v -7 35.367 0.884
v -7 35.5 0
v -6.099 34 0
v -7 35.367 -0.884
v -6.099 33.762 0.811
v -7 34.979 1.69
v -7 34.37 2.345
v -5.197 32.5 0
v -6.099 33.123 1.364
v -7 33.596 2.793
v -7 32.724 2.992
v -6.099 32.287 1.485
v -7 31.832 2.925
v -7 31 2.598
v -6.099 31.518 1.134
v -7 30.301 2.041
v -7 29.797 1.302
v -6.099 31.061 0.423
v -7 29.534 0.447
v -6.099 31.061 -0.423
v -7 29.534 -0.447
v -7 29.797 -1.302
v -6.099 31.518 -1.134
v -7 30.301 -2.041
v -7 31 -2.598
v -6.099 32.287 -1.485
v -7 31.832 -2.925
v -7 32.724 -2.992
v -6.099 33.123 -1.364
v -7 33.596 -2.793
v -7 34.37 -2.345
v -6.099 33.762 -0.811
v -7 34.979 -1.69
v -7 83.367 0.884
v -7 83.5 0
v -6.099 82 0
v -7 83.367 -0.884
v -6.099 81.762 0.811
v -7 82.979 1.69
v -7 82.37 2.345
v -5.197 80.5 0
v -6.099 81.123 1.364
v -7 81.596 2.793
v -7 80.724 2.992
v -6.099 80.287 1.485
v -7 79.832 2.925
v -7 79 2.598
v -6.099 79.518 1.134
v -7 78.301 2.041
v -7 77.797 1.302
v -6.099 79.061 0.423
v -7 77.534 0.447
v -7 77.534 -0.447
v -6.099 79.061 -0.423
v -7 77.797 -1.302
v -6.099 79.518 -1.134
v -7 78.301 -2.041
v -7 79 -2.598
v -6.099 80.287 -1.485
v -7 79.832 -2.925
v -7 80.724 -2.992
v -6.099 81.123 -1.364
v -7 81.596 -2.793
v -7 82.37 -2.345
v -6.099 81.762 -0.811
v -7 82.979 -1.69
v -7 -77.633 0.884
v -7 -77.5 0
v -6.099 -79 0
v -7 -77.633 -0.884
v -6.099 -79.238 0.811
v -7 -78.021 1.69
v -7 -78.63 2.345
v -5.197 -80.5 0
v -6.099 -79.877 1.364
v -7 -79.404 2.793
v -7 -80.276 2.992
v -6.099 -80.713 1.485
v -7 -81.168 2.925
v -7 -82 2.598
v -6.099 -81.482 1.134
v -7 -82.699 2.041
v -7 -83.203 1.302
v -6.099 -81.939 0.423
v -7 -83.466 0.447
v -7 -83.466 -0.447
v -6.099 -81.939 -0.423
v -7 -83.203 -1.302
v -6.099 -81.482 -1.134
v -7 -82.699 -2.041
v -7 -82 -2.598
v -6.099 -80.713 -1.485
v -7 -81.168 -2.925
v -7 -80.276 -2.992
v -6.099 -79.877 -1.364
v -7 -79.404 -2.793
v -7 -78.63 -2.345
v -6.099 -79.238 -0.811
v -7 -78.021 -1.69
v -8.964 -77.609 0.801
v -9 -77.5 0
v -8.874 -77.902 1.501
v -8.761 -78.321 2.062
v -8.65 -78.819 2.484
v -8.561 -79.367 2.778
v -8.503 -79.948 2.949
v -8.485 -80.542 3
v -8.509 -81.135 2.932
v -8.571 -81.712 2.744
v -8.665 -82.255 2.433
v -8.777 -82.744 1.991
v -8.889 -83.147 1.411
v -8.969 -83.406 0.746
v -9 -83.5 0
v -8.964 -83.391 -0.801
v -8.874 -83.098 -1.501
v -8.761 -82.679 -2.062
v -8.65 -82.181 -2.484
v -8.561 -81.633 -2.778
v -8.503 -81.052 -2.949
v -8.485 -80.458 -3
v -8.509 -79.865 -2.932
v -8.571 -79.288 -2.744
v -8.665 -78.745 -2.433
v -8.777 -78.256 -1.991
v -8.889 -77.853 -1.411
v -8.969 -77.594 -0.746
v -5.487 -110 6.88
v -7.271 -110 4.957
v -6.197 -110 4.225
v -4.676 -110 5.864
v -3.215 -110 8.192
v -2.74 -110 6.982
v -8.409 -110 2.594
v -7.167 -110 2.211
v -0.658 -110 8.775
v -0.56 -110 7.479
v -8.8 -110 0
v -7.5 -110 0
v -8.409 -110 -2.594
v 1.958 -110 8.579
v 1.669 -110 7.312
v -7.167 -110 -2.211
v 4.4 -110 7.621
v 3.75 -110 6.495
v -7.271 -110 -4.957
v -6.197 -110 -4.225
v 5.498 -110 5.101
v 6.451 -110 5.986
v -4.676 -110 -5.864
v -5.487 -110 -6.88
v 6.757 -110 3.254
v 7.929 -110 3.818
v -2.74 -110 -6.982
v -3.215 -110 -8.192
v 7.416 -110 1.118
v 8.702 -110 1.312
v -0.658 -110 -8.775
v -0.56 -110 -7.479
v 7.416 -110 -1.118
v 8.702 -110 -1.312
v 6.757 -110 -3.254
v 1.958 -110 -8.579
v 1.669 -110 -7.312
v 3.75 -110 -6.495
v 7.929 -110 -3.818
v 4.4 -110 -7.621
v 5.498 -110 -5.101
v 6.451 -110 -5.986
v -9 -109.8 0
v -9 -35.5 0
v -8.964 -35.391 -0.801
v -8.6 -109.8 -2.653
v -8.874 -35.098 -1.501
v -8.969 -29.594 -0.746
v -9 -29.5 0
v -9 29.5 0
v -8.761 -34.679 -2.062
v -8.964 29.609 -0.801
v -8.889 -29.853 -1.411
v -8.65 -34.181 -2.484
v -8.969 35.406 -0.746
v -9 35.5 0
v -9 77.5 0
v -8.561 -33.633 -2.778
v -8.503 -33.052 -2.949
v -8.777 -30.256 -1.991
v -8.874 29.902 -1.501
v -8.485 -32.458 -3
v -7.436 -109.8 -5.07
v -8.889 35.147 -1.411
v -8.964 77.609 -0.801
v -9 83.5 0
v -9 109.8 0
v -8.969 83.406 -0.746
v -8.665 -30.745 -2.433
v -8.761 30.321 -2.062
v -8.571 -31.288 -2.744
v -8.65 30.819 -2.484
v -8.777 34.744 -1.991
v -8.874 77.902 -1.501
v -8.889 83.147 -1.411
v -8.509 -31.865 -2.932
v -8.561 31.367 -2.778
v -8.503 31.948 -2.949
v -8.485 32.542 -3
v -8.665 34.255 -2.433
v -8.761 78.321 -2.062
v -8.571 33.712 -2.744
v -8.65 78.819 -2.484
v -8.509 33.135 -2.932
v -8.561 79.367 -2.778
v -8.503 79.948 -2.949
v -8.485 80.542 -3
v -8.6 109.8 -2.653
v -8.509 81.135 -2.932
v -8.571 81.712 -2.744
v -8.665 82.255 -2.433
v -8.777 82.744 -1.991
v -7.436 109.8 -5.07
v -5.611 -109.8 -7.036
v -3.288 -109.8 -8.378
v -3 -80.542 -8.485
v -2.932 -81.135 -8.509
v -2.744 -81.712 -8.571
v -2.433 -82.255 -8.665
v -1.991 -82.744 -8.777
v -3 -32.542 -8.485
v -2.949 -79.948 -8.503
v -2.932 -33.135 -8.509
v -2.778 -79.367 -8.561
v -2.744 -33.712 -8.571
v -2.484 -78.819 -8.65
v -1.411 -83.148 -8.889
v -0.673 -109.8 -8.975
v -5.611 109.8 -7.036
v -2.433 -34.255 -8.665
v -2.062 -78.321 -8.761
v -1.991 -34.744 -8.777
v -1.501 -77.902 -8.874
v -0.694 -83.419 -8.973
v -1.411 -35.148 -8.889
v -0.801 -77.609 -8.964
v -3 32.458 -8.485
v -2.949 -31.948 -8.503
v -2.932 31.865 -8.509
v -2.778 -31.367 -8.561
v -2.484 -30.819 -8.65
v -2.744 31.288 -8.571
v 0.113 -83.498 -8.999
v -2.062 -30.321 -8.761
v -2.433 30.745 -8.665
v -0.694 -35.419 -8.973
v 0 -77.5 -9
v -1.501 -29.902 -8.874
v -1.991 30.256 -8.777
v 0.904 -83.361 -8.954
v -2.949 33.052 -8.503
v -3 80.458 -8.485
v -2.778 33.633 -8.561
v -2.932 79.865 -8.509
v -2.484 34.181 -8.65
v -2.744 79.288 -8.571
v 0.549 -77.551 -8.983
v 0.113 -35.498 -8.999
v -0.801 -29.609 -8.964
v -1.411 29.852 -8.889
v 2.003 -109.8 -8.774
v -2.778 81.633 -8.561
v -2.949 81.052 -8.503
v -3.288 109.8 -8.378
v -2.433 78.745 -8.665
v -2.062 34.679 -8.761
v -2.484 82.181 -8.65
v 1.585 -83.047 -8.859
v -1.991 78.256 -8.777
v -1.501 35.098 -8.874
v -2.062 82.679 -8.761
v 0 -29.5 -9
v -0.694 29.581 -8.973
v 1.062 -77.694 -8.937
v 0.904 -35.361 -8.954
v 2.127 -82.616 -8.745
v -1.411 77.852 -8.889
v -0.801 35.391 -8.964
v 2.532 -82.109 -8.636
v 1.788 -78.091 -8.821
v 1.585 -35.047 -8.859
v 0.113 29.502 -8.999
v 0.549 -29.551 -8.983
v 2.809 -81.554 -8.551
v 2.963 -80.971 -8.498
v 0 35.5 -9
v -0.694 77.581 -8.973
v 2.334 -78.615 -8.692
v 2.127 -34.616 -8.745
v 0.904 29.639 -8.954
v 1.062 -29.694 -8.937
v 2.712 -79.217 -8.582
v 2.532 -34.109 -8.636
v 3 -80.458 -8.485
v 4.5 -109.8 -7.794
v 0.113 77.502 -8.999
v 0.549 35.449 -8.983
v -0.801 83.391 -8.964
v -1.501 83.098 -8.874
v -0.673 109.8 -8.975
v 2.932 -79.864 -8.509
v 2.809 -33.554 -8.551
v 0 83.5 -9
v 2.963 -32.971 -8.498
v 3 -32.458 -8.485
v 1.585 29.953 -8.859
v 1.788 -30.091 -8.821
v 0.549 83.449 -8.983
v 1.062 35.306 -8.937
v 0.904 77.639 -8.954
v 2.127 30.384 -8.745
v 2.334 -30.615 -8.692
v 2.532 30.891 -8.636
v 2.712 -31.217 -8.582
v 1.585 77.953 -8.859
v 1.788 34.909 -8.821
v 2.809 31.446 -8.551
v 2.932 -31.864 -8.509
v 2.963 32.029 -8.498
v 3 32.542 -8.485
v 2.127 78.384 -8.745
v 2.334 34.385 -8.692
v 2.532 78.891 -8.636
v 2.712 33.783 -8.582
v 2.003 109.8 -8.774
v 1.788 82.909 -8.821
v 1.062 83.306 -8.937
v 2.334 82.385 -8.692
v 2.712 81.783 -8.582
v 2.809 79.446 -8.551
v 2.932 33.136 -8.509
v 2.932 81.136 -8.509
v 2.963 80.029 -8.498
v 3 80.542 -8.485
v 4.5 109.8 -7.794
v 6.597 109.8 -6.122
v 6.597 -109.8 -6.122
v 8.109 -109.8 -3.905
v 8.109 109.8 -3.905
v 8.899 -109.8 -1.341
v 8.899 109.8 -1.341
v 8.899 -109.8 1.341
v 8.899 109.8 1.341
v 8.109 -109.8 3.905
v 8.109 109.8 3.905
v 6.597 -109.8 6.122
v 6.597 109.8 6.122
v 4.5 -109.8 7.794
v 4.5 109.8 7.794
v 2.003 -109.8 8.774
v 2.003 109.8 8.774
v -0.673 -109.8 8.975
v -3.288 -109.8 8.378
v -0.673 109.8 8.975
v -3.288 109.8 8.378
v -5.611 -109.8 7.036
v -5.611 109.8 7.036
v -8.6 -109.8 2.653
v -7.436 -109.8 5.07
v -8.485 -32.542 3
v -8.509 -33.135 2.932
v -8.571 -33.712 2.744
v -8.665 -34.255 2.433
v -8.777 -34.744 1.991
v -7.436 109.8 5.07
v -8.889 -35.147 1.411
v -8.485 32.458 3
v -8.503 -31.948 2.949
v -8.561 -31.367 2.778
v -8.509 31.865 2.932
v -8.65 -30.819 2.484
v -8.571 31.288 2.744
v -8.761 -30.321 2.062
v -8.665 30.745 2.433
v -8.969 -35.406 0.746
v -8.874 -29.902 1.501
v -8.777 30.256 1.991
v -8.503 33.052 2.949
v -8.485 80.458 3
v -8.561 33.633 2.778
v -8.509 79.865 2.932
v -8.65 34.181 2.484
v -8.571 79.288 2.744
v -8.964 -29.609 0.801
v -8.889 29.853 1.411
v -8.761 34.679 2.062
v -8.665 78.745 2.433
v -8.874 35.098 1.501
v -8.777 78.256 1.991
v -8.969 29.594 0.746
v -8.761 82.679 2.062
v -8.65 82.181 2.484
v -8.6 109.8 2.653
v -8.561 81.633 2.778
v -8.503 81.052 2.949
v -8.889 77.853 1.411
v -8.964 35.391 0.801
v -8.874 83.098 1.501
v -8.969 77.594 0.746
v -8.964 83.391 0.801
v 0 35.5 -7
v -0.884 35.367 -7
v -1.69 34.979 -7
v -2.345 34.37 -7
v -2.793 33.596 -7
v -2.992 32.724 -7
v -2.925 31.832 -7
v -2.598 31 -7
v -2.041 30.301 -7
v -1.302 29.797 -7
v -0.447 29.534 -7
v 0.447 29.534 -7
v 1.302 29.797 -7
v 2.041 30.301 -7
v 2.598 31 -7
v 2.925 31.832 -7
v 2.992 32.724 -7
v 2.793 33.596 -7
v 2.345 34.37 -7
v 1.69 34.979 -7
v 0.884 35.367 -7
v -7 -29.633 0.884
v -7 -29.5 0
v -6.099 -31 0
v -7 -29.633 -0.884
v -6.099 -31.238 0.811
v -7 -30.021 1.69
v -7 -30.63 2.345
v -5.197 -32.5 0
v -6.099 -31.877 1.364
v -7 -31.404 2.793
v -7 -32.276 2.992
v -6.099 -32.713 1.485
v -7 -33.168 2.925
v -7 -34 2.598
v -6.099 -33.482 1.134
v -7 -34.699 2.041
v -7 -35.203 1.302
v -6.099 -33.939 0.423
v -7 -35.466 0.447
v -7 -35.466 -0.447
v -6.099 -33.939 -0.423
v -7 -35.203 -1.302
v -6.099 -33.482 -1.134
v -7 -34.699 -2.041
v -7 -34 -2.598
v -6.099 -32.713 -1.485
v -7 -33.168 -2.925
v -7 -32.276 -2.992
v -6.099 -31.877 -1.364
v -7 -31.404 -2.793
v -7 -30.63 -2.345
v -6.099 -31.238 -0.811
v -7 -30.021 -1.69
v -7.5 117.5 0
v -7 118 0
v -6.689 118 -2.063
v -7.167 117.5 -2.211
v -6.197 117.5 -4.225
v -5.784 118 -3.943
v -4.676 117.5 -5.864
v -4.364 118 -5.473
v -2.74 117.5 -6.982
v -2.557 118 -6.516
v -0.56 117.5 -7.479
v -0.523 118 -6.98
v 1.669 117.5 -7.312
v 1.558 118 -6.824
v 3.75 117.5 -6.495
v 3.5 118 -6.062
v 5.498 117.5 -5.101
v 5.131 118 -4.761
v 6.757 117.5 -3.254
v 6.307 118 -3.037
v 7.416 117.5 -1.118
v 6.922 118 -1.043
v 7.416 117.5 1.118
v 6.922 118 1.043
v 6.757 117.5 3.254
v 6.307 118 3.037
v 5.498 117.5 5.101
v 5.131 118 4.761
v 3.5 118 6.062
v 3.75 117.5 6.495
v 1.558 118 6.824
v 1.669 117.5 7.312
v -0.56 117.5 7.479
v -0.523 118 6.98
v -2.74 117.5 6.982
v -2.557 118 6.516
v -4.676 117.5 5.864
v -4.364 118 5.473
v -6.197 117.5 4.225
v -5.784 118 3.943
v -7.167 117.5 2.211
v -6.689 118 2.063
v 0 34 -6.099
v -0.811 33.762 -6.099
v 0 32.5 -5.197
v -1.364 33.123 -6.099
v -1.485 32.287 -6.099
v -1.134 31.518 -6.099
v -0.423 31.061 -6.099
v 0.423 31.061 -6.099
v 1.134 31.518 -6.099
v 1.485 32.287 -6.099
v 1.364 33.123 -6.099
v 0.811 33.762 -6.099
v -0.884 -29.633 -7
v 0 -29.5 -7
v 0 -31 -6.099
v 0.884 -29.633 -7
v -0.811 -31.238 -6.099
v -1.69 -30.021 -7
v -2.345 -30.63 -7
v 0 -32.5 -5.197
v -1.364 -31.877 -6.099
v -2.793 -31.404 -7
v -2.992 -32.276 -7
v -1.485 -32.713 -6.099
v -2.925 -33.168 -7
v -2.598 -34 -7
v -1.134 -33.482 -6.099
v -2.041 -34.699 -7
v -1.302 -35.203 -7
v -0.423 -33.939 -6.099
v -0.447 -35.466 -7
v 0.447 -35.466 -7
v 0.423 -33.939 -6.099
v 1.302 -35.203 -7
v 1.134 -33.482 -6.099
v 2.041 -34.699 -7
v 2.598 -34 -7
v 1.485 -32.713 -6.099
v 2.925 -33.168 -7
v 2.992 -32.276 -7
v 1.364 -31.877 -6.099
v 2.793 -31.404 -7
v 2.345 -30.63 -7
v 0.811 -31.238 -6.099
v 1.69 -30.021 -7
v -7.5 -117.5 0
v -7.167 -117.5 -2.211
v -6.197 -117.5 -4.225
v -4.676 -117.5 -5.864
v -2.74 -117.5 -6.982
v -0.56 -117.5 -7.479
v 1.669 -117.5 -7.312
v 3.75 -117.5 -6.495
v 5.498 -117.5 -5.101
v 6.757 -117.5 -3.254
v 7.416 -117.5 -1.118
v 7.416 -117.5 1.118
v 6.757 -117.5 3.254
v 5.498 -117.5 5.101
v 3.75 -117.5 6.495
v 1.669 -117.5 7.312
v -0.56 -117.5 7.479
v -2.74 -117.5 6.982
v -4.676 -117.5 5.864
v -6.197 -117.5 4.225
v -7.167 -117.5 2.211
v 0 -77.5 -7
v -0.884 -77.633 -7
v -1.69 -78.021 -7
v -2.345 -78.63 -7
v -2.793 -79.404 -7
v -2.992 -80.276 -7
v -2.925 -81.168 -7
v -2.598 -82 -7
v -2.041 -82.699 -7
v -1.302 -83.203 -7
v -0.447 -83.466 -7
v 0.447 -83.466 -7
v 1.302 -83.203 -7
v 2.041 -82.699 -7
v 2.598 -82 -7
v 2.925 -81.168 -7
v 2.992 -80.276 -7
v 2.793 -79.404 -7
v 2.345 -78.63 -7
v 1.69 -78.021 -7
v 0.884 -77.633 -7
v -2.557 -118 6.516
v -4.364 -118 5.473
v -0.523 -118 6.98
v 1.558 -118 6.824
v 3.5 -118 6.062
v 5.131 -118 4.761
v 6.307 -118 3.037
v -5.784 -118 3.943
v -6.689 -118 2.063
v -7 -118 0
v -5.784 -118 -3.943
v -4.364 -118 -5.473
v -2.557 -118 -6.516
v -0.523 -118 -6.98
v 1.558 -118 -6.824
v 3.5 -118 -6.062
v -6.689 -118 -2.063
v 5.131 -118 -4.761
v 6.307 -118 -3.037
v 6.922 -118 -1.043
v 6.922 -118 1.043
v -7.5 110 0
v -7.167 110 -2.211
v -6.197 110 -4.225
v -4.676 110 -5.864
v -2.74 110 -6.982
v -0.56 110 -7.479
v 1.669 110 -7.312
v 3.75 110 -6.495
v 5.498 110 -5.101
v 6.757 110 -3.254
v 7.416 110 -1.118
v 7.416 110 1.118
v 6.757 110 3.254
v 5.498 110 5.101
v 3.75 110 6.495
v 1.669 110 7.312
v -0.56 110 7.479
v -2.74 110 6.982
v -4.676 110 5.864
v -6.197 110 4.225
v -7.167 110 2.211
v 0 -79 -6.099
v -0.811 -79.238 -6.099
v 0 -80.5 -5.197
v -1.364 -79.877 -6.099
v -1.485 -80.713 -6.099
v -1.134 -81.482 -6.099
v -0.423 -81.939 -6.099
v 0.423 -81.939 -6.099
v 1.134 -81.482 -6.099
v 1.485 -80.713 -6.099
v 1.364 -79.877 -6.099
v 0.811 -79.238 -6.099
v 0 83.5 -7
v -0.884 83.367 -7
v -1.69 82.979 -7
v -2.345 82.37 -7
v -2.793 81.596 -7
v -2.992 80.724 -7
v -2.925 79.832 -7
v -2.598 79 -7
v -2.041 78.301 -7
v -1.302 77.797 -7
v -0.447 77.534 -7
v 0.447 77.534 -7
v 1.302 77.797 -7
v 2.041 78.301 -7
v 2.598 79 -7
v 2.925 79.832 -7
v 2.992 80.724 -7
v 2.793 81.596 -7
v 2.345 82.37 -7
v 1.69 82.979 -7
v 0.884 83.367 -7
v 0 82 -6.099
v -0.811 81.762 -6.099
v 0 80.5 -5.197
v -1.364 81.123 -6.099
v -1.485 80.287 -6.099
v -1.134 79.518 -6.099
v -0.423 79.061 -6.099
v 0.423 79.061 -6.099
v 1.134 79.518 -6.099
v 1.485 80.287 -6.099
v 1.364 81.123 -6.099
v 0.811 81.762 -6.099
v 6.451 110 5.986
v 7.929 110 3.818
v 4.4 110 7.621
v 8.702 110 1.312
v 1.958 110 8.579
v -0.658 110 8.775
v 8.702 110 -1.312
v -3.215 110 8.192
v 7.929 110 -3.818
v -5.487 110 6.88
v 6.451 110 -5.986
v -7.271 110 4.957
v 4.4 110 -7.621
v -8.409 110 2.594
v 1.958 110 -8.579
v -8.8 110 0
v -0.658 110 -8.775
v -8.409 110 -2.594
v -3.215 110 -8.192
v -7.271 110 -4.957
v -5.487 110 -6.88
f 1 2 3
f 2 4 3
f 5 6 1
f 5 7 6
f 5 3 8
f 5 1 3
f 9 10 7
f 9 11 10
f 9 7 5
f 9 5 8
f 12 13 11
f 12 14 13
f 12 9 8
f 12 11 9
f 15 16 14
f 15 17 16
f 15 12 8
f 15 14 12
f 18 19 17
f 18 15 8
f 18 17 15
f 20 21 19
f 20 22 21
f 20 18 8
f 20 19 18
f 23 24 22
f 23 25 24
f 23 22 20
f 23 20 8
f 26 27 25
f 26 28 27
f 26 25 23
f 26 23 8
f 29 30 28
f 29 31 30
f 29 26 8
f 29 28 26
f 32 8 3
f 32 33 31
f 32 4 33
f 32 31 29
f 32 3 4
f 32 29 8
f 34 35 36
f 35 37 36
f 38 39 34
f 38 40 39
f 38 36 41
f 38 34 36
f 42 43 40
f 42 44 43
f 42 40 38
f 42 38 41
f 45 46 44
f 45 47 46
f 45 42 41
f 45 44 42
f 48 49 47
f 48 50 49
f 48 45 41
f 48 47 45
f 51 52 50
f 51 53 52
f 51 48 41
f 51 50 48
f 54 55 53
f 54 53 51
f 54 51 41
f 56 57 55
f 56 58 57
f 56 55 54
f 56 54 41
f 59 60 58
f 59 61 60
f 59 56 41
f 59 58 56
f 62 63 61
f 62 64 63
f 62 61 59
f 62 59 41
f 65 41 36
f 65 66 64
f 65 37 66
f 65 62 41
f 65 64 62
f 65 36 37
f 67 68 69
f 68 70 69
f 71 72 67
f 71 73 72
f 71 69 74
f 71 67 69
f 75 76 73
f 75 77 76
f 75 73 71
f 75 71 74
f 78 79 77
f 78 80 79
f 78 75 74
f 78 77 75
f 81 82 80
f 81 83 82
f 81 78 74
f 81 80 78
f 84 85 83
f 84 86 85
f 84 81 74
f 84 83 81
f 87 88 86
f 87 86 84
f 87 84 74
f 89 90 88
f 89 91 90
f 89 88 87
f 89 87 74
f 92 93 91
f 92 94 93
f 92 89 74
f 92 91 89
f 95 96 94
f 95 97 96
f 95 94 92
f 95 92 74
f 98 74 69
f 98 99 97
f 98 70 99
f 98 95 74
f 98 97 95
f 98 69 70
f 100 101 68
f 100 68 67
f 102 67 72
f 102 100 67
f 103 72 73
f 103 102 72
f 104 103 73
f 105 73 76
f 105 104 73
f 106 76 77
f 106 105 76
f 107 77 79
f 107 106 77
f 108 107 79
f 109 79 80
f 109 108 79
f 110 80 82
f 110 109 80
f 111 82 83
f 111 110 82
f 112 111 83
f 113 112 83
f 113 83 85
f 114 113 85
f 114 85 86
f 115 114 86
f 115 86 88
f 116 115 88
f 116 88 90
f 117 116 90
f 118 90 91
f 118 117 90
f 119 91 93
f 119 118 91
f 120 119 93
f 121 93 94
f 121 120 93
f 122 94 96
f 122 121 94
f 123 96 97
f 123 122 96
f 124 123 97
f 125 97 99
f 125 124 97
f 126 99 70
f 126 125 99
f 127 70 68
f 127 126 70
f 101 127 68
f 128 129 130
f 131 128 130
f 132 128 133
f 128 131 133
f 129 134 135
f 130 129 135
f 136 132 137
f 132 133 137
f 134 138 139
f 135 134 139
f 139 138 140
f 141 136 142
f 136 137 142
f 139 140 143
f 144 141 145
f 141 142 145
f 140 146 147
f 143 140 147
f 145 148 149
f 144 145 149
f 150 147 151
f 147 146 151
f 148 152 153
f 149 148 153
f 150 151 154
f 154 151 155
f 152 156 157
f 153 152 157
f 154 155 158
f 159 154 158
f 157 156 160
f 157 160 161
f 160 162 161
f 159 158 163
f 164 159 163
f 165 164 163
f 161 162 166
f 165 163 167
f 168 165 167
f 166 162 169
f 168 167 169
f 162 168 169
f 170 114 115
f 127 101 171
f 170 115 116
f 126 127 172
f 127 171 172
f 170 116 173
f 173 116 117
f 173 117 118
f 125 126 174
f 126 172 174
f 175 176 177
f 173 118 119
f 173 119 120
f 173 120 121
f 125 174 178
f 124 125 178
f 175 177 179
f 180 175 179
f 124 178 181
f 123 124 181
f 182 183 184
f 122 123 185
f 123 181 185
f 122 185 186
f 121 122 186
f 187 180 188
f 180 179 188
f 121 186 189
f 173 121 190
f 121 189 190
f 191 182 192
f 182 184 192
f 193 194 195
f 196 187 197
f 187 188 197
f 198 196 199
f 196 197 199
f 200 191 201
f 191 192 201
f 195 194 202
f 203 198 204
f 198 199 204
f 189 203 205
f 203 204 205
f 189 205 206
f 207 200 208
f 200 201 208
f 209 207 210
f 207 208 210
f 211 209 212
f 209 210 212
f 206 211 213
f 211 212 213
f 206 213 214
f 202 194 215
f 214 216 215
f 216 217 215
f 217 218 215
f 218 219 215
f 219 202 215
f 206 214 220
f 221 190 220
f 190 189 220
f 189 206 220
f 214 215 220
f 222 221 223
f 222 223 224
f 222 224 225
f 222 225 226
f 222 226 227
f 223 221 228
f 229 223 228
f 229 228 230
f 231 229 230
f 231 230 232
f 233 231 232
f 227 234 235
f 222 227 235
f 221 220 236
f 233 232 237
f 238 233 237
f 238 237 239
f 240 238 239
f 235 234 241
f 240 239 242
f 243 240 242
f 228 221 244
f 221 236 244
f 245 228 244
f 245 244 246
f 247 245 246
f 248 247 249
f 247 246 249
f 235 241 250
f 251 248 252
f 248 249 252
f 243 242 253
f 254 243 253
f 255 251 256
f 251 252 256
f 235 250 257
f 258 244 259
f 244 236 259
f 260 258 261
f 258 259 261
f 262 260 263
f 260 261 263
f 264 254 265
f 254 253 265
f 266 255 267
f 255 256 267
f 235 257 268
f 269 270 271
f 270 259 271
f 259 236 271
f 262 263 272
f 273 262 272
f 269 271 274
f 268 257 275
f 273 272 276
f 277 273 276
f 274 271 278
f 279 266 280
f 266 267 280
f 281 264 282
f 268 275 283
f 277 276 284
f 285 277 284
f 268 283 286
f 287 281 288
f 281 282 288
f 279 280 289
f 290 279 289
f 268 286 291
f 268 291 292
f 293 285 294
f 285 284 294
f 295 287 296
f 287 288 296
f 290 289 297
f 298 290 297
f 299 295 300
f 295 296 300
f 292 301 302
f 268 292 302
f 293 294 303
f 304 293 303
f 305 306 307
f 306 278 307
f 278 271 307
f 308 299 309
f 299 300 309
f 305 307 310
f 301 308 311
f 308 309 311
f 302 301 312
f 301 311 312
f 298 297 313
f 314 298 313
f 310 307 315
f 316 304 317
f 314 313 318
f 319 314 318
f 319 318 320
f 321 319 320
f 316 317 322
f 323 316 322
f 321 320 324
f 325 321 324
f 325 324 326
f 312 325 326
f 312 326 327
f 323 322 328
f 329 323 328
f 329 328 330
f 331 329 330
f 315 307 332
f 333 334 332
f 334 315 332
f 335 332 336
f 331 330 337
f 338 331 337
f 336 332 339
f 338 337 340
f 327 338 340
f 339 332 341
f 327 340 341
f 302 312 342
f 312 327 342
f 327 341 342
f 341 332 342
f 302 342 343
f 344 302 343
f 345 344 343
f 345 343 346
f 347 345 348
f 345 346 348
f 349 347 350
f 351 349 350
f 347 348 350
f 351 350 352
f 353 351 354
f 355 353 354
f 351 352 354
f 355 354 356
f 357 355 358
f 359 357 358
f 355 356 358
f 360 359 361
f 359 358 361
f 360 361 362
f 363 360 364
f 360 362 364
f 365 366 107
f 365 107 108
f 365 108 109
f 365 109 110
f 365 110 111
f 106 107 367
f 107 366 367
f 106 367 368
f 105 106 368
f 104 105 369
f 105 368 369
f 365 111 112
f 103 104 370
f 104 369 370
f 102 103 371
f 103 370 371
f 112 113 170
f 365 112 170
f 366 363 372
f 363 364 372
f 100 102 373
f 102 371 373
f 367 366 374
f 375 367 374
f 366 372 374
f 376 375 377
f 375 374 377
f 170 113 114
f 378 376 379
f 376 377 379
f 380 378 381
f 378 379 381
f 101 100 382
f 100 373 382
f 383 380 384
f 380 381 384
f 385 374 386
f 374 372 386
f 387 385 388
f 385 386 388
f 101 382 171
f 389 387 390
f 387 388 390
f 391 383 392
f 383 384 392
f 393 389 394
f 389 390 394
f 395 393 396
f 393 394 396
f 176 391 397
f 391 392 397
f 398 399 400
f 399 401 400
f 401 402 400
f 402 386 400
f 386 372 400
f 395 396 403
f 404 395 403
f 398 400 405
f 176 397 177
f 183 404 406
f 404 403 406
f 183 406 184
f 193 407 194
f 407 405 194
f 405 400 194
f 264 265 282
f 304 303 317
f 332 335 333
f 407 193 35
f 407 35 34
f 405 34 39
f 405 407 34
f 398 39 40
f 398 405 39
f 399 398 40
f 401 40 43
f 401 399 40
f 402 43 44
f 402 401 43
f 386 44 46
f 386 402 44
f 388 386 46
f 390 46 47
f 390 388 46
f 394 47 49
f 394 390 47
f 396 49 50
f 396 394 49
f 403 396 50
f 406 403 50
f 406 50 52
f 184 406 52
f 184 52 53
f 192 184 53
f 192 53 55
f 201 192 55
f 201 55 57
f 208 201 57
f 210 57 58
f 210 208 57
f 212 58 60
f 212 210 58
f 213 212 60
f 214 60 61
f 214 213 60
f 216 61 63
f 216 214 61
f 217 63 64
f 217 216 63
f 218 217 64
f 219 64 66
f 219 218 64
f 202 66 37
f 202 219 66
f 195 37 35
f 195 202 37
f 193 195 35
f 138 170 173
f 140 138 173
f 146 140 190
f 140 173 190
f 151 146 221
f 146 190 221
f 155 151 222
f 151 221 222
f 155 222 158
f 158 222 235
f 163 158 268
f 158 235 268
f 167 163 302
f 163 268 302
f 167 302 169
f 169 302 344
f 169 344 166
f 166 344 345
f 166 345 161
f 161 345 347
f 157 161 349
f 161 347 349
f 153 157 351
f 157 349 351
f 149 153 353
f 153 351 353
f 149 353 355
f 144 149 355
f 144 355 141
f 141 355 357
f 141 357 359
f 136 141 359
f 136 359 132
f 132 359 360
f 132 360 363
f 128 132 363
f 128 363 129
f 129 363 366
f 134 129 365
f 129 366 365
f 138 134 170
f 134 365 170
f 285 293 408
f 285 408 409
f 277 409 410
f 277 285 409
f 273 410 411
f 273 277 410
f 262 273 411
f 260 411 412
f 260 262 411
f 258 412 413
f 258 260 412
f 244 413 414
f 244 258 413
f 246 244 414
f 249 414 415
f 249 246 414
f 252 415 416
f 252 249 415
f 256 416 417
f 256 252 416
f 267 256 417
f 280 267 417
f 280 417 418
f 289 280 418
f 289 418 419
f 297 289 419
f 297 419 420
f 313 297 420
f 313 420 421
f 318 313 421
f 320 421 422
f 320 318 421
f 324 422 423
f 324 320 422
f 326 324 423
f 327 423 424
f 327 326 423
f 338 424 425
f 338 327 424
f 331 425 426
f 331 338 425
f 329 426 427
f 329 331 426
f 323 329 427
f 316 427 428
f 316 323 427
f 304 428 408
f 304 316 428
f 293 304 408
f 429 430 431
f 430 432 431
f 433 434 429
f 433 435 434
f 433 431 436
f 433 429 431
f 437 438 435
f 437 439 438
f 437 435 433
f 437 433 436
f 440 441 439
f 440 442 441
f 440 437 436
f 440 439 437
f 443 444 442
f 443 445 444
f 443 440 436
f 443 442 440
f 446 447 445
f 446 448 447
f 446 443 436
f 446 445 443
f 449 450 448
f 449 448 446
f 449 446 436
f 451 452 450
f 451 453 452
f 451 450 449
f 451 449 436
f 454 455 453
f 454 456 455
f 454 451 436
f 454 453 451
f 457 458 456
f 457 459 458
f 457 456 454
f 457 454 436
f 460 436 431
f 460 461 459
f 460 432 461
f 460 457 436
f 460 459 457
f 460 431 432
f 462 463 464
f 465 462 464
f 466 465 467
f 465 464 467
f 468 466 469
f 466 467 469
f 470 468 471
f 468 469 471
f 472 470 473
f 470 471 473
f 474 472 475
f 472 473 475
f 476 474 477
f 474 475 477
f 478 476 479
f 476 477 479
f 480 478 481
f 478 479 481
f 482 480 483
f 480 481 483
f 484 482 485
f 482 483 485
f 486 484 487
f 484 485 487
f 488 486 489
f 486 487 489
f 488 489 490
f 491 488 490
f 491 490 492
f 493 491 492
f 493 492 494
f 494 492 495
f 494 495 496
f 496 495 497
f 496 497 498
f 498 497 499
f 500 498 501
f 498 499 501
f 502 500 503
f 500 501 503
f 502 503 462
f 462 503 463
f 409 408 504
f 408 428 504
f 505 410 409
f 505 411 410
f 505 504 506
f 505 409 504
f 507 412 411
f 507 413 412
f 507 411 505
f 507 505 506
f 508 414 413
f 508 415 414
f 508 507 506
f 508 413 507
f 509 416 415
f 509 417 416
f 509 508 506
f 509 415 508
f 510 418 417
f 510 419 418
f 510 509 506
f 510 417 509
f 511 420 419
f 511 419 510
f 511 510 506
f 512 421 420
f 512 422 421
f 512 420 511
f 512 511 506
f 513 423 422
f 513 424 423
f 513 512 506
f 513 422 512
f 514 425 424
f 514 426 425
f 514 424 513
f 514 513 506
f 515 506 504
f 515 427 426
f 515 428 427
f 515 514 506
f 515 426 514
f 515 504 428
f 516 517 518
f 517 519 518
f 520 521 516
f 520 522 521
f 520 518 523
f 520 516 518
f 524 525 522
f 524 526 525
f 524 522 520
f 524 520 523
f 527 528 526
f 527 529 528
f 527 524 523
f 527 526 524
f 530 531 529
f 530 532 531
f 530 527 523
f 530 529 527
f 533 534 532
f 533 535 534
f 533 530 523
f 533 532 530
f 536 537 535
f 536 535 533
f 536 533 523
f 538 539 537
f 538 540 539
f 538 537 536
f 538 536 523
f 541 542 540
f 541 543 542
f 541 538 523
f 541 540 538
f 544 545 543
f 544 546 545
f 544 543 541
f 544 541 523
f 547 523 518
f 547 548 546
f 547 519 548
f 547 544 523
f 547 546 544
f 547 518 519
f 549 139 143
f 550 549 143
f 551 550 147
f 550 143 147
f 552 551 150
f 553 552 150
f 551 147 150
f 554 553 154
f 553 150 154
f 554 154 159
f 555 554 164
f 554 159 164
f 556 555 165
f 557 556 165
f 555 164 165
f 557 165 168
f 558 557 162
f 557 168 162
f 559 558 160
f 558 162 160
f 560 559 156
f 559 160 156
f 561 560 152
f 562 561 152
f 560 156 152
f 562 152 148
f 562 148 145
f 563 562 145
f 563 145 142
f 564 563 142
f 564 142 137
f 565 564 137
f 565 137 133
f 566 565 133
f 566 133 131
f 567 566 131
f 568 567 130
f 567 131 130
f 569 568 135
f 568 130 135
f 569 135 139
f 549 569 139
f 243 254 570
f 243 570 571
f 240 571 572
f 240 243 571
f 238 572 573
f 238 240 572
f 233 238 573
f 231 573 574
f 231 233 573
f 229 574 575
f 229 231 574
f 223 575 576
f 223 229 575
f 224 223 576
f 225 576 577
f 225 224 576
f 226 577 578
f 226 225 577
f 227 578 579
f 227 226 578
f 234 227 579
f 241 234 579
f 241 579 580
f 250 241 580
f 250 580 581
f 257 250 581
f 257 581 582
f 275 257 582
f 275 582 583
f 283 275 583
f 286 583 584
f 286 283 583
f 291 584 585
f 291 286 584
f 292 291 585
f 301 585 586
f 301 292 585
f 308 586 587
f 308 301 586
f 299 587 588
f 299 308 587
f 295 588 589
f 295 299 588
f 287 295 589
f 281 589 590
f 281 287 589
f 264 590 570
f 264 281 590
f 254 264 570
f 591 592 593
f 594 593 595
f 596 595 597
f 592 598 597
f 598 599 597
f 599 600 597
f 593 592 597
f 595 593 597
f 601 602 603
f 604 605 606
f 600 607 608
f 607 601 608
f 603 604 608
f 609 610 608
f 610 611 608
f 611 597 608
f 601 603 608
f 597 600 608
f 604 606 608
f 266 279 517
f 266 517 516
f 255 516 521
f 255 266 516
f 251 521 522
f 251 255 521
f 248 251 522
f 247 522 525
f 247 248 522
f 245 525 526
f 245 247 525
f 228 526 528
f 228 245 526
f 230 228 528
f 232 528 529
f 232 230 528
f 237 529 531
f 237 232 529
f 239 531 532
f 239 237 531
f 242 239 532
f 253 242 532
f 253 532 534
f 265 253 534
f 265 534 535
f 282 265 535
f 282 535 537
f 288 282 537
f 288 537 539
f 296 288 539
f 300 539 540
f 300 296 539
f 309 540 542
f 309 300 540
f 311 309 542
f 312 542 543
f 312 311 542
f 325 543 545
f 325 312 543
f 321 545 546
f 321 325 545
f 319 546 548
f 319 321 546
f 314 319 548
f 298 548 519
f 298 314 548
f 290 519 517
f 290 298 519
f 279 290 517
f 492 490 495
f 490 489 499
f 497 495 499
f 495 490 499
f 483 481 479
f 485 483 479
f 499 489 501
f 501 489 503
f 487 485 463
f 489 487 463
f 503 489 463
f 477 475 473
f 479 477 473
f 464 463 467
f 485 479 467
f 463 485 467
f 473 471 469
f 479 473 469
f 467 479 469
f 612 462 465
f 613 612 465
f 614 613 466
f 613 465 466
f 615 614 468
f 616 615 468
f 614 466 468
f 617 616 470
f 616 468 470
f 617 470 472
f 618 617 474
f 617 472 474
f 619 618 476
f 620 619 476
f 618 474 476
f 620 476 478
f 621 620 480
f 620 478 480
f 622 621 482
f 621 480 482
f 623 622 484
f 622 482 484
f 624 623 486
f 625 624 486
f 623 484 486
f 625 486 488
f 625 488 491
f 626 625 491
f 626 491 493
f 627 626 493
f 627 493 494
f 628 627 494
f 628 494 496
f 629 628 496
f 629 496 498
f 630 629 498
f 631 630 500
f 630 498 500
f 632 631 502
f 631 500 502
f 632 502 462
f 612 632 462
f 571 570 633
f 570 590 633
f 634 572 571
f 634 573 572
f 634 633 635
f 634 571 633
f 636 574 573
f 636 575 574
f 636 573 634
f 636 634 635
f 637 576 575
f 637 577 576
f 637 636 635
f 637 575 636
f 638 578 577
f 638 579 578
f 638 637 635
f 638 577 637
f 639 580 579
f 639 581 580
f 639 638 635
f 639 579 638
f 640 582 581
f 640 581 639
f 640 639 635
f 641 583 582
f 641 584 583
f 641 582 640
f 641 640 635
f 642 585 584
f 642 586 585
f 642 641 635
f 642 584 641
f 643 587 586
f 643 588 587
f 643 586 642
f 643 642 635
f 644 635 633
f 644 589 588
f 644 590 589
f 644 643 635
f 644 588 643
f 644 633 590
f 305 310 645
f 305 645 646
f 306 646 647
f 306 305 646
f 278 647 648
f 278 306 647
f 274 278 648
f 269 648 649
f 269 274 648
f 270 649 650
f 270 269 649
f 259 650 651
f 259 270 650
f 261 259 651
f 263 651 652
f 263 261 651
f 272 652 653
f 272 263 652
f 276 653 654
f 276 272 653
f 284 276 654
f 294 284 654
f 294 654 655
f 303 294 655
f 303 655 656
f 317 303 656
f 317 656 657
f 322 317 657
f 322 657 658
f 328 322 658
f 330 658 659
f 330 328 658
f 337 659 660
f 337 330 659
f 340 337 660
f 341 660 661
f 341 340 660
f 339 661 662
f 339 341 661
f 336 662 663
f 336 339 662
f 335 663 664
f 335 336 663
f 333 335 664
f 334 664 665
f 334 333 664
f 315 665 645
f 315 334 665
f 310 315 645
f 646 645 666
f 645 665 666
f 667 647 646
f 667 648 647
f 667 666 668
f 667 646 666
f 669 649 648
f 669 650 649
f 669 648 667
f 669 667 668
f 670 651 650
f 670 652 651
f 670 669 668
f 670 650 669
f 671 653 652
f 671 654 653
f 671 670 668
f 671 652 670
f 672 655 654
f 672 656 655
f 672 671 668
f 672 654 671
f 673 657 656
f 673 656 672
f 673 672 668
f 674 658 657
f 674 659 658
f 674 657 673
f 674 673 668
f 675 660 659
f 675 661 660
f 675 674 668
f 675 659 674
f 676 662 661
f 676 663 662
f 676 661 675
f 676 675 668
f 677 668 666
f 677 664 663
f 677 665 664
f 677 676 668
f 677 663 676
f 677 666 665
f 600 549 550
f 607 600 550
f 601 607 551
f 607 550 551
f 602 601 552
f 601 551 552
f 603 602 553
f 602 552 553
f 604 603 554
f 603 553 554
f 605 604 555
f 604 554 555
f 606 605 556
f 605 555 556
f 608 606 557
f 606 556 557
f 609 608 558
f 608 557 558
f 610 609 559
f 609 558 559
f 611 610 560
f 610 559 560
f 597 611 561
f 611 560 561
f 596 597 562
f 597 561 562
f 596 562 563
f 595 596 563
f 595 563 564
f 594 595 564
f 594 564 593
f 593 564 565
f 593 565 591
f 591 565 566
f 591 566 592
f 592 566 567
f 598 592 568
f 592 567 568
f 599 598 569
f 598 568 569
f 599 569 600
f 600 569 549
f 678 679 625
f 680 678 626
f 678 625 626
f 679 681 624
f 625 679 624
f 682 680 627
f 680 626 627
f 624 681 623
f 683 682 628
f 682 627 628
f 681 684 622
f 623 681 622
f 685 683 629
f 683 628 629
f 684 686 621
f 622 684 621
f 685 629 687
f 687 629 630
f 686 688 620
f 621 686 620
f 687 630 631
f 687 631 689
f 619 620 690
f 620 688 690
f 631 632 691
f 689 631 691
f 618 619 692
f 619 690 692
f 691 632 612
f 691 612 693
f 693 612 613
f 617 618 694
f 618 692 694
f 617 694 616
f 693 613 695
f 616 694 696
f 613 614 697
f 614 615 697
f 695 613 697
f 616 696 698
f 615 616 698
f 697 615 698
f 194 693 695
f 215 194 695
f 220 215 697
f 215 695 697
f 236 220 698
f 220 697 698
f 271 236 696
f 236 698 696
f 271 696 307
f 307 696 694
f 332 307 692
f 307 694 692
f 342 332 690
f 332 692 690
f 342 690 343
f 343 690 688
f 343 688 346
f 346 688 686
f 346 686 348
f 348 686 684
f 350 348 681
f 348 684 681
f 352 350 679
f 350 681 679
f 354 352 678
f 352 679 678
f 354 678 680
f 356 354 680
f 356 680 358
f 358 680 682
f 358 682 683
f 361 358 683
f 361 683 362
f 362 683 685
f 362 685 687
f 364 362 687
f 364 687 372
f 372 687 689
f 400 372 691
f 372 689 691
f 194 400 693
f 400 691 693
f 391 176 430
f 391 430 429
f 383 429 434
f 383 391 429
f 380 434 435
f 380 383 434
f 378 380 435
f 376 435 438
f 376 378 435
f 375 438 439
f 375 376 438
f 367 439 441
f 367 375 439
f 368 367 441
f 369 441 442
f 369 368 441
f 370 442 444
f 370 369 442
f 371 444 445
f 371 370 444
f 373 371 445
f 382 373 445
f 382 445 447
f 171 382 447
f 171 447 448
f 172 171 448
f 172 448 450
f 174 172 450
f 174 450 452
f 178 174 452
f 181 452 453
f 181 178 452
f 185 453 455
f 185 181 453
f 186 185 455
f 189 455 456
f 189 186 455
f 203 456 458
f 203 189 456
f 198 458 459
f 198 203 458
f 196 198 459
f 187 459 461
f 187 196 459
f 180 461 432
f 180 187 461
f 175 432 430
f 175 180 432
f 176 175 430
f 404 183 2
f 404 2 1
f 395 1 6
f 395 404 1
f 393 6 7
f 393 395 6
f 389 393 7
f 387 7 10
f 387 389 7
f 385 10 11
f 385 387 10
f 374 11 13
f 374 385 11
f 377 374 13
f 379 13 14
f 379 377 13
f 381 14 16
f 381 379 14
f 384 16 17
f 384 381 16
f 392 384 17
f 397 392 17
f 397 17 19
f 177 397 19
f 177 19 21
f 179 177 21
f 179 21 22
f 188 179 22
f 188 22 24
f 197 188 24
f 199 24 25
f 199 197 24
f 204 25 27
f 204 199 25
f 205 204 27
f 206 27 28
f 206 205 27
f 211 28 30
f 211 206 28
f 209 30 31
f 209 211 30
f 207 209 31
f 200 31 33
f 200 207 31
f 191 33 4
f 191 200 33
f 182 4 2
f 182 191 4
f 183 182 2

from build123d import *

# Parameters (mm, degrees)
CHAMFER_1_SIZE                 = 0.5
HOLE_WIZARD_6_0_6_4_AT_2_COUNT = 2
HOLE_WIZARD_6_0_6_4_AT_2_PITCH = 65
HOLE_WIZARD_6_0_6_4_AT_3_COUNT = 2
HOLE_WIZARD_6_0_6_4_AT_3_PITCH = 113
HOLE_WIZARD_6_0_6_4_AT_4_COUNT = 2
HOLE_WIZARD_6_0_6_4_AT_4_PITCH = 48
PATTERN_CIRCULAR_1_COUNT       = 4
CHAMFER_2_SIZE                 = 0.2


with BuildPart() as part:
    # 草图1 → 旋转1 (revolve)
    with BuildSketch(Plane.XY):
        Polygon((0, 118), (0, -118), (-7.5, -118), (-7.5, -110), (-9, -110), (-9, 110), (-7.5, 110), (-7.5, 118), align=None)
    revolve(axis=Axis((0, 118, 0), (0, -1, 0)))

    # 倒角1
    chamfer_1_edges = [part.edges().sort_by_distance(p)[0] for p in [
        (7.5, 118, 0),
        (7.5, -118, 0),
    ]]
    chamfer(chamfer_1_edges, length=CHAMFER_1_SIZE)

    # 草图3 → Ø6.0 (6) 直径孔4 (revolve, cut)
    with BuildSketch(Plane(origin=(0, -32.5, -9), x_dir=(0, 1, 0), z_dir=(1, 0, 0))):
        Polygon((0, 0), (0, 3.802581857), (3, 2), (3, 0), align=None)
    hole_wizard_6_0_6_4 = revolve(axis=Axis((0, -32.5, -15.35), (0, 0, 1)), mode=Mode.SUBTRACT)

    # Ø6.0 (6) 直径孔4 at 2: Ø6.0 (6) 直径孔4 ×2
    with Locations(*[(0, i * HOLE_WIZARD_6_0_6_4_AT_2_PITCH, 0) for i in range(1, HOLE_WIZARD_6_0_6_4_AT_2_COUNT)]):
        add(hole_wizard_6_0_6_4, mode=Mode.SUBTRACT)

    # Ø6.0 (6) 直径孔4 at 3: Ø6.0 (6) 直径孔4 ×2
    with Locations(*[(0, i * HOLE_WIZARD_6_0_6_4_AT_3_PITCH, 0) for i in range(1, HOLE_WIZARD_6_0_6_4_AT_3_COUNT)]):
        add(hole_wizard_6_0_6_4, mode=Mode.SUBTRACT)

    # Ø6.0 (6) 直径孔4 at 4: Ø6.0 (6) 直径孔4 ×2
    with Locations(*[(0, -i * HOLE_WIZARD_6_0_6_4_AT_4_PITCH, 0) for i in range(1, HOLE_WIZARD_6_0_6_4_AT_4_COUNT)]):
        add(hole_wizard_6_0_6_4, mode=Mode.SUBTRACT)

    # 阵列(圆周)1: Ø6.0 (6) 直径孔4 ×4 about axis, 2 skipped
    pattern_circular_1_axis = Axis((0, 118, 0), (0, 1, 0))
    add([hole_wizard_6_0_6_4.rotate(pattern_circular_1_axis, i * 360 / PATTERN_CIRCULAR_1_COUNT) for i in range(1, PATTERN_CIRCULAR_1_COUNT) if i not in (2, 3)], mode=Mode.SUBTRACT)

    # 阵列(圆周)1 copy 1 sketch → 阵列(圆周)1 copy 1 (revolve, cut)
    with BuildSketch(Plane(origin=(-9, 32.5, 0), x_dir=(0, 1, 0), z_dir=(0, 0, -1))):
        Polygon((0, 0), (0, 3.802581857), (3, 2), (3, 0), align=None)
    revolve(axis=Axis((-15.35, 32.5, 0), (1, 0, 0)), mode=Mode.SUBTRACT)

    # 阵列(圆周)1 copy 2 sketch → 阵列(圆周)1 copy 2 (revolve, cut)
    with BuildSketch(Plane(origin=(-9, 80.5, 0), x_dir=(0, 1, 0), z_dir=(0, 0, -1))):
        Polygon((0, 0), (0, 3.802581857), (3, 2), (3, 0), align=None)
    revolve(axis=Axis((-15.35, 80.5, 0), (1, 0, 0)), mode=Mode.SUBTRACT)

    # 阵列(圆周)1 copy 3 sketch → 阵列(圆周)1 copy 3 (revolve, cut)
    with BuildSketch(Plane(origin=(-9, -80.5, 0), x_dir=(0, 1, 0), z_dir=(0, 0, -1))):
        Polygon((0, 0), (0, 3.802581857), (3, 2), (3, 0), align=None)
    revolve(axis=Axis((-15.35, -80.5, 0), (1, 0, 0)), mode=Mode.SUBTRACT)

    # 倒角2
    chamfer_2_edges = [part.edges().sort_by_distance(p)[0] for p in [
        (9, 110, 0),
        (9, -110, 0),
    ]]
    chamfer(chamfer_2_edges, length=CHAMFER_2_SIZE)


solid = part.part
